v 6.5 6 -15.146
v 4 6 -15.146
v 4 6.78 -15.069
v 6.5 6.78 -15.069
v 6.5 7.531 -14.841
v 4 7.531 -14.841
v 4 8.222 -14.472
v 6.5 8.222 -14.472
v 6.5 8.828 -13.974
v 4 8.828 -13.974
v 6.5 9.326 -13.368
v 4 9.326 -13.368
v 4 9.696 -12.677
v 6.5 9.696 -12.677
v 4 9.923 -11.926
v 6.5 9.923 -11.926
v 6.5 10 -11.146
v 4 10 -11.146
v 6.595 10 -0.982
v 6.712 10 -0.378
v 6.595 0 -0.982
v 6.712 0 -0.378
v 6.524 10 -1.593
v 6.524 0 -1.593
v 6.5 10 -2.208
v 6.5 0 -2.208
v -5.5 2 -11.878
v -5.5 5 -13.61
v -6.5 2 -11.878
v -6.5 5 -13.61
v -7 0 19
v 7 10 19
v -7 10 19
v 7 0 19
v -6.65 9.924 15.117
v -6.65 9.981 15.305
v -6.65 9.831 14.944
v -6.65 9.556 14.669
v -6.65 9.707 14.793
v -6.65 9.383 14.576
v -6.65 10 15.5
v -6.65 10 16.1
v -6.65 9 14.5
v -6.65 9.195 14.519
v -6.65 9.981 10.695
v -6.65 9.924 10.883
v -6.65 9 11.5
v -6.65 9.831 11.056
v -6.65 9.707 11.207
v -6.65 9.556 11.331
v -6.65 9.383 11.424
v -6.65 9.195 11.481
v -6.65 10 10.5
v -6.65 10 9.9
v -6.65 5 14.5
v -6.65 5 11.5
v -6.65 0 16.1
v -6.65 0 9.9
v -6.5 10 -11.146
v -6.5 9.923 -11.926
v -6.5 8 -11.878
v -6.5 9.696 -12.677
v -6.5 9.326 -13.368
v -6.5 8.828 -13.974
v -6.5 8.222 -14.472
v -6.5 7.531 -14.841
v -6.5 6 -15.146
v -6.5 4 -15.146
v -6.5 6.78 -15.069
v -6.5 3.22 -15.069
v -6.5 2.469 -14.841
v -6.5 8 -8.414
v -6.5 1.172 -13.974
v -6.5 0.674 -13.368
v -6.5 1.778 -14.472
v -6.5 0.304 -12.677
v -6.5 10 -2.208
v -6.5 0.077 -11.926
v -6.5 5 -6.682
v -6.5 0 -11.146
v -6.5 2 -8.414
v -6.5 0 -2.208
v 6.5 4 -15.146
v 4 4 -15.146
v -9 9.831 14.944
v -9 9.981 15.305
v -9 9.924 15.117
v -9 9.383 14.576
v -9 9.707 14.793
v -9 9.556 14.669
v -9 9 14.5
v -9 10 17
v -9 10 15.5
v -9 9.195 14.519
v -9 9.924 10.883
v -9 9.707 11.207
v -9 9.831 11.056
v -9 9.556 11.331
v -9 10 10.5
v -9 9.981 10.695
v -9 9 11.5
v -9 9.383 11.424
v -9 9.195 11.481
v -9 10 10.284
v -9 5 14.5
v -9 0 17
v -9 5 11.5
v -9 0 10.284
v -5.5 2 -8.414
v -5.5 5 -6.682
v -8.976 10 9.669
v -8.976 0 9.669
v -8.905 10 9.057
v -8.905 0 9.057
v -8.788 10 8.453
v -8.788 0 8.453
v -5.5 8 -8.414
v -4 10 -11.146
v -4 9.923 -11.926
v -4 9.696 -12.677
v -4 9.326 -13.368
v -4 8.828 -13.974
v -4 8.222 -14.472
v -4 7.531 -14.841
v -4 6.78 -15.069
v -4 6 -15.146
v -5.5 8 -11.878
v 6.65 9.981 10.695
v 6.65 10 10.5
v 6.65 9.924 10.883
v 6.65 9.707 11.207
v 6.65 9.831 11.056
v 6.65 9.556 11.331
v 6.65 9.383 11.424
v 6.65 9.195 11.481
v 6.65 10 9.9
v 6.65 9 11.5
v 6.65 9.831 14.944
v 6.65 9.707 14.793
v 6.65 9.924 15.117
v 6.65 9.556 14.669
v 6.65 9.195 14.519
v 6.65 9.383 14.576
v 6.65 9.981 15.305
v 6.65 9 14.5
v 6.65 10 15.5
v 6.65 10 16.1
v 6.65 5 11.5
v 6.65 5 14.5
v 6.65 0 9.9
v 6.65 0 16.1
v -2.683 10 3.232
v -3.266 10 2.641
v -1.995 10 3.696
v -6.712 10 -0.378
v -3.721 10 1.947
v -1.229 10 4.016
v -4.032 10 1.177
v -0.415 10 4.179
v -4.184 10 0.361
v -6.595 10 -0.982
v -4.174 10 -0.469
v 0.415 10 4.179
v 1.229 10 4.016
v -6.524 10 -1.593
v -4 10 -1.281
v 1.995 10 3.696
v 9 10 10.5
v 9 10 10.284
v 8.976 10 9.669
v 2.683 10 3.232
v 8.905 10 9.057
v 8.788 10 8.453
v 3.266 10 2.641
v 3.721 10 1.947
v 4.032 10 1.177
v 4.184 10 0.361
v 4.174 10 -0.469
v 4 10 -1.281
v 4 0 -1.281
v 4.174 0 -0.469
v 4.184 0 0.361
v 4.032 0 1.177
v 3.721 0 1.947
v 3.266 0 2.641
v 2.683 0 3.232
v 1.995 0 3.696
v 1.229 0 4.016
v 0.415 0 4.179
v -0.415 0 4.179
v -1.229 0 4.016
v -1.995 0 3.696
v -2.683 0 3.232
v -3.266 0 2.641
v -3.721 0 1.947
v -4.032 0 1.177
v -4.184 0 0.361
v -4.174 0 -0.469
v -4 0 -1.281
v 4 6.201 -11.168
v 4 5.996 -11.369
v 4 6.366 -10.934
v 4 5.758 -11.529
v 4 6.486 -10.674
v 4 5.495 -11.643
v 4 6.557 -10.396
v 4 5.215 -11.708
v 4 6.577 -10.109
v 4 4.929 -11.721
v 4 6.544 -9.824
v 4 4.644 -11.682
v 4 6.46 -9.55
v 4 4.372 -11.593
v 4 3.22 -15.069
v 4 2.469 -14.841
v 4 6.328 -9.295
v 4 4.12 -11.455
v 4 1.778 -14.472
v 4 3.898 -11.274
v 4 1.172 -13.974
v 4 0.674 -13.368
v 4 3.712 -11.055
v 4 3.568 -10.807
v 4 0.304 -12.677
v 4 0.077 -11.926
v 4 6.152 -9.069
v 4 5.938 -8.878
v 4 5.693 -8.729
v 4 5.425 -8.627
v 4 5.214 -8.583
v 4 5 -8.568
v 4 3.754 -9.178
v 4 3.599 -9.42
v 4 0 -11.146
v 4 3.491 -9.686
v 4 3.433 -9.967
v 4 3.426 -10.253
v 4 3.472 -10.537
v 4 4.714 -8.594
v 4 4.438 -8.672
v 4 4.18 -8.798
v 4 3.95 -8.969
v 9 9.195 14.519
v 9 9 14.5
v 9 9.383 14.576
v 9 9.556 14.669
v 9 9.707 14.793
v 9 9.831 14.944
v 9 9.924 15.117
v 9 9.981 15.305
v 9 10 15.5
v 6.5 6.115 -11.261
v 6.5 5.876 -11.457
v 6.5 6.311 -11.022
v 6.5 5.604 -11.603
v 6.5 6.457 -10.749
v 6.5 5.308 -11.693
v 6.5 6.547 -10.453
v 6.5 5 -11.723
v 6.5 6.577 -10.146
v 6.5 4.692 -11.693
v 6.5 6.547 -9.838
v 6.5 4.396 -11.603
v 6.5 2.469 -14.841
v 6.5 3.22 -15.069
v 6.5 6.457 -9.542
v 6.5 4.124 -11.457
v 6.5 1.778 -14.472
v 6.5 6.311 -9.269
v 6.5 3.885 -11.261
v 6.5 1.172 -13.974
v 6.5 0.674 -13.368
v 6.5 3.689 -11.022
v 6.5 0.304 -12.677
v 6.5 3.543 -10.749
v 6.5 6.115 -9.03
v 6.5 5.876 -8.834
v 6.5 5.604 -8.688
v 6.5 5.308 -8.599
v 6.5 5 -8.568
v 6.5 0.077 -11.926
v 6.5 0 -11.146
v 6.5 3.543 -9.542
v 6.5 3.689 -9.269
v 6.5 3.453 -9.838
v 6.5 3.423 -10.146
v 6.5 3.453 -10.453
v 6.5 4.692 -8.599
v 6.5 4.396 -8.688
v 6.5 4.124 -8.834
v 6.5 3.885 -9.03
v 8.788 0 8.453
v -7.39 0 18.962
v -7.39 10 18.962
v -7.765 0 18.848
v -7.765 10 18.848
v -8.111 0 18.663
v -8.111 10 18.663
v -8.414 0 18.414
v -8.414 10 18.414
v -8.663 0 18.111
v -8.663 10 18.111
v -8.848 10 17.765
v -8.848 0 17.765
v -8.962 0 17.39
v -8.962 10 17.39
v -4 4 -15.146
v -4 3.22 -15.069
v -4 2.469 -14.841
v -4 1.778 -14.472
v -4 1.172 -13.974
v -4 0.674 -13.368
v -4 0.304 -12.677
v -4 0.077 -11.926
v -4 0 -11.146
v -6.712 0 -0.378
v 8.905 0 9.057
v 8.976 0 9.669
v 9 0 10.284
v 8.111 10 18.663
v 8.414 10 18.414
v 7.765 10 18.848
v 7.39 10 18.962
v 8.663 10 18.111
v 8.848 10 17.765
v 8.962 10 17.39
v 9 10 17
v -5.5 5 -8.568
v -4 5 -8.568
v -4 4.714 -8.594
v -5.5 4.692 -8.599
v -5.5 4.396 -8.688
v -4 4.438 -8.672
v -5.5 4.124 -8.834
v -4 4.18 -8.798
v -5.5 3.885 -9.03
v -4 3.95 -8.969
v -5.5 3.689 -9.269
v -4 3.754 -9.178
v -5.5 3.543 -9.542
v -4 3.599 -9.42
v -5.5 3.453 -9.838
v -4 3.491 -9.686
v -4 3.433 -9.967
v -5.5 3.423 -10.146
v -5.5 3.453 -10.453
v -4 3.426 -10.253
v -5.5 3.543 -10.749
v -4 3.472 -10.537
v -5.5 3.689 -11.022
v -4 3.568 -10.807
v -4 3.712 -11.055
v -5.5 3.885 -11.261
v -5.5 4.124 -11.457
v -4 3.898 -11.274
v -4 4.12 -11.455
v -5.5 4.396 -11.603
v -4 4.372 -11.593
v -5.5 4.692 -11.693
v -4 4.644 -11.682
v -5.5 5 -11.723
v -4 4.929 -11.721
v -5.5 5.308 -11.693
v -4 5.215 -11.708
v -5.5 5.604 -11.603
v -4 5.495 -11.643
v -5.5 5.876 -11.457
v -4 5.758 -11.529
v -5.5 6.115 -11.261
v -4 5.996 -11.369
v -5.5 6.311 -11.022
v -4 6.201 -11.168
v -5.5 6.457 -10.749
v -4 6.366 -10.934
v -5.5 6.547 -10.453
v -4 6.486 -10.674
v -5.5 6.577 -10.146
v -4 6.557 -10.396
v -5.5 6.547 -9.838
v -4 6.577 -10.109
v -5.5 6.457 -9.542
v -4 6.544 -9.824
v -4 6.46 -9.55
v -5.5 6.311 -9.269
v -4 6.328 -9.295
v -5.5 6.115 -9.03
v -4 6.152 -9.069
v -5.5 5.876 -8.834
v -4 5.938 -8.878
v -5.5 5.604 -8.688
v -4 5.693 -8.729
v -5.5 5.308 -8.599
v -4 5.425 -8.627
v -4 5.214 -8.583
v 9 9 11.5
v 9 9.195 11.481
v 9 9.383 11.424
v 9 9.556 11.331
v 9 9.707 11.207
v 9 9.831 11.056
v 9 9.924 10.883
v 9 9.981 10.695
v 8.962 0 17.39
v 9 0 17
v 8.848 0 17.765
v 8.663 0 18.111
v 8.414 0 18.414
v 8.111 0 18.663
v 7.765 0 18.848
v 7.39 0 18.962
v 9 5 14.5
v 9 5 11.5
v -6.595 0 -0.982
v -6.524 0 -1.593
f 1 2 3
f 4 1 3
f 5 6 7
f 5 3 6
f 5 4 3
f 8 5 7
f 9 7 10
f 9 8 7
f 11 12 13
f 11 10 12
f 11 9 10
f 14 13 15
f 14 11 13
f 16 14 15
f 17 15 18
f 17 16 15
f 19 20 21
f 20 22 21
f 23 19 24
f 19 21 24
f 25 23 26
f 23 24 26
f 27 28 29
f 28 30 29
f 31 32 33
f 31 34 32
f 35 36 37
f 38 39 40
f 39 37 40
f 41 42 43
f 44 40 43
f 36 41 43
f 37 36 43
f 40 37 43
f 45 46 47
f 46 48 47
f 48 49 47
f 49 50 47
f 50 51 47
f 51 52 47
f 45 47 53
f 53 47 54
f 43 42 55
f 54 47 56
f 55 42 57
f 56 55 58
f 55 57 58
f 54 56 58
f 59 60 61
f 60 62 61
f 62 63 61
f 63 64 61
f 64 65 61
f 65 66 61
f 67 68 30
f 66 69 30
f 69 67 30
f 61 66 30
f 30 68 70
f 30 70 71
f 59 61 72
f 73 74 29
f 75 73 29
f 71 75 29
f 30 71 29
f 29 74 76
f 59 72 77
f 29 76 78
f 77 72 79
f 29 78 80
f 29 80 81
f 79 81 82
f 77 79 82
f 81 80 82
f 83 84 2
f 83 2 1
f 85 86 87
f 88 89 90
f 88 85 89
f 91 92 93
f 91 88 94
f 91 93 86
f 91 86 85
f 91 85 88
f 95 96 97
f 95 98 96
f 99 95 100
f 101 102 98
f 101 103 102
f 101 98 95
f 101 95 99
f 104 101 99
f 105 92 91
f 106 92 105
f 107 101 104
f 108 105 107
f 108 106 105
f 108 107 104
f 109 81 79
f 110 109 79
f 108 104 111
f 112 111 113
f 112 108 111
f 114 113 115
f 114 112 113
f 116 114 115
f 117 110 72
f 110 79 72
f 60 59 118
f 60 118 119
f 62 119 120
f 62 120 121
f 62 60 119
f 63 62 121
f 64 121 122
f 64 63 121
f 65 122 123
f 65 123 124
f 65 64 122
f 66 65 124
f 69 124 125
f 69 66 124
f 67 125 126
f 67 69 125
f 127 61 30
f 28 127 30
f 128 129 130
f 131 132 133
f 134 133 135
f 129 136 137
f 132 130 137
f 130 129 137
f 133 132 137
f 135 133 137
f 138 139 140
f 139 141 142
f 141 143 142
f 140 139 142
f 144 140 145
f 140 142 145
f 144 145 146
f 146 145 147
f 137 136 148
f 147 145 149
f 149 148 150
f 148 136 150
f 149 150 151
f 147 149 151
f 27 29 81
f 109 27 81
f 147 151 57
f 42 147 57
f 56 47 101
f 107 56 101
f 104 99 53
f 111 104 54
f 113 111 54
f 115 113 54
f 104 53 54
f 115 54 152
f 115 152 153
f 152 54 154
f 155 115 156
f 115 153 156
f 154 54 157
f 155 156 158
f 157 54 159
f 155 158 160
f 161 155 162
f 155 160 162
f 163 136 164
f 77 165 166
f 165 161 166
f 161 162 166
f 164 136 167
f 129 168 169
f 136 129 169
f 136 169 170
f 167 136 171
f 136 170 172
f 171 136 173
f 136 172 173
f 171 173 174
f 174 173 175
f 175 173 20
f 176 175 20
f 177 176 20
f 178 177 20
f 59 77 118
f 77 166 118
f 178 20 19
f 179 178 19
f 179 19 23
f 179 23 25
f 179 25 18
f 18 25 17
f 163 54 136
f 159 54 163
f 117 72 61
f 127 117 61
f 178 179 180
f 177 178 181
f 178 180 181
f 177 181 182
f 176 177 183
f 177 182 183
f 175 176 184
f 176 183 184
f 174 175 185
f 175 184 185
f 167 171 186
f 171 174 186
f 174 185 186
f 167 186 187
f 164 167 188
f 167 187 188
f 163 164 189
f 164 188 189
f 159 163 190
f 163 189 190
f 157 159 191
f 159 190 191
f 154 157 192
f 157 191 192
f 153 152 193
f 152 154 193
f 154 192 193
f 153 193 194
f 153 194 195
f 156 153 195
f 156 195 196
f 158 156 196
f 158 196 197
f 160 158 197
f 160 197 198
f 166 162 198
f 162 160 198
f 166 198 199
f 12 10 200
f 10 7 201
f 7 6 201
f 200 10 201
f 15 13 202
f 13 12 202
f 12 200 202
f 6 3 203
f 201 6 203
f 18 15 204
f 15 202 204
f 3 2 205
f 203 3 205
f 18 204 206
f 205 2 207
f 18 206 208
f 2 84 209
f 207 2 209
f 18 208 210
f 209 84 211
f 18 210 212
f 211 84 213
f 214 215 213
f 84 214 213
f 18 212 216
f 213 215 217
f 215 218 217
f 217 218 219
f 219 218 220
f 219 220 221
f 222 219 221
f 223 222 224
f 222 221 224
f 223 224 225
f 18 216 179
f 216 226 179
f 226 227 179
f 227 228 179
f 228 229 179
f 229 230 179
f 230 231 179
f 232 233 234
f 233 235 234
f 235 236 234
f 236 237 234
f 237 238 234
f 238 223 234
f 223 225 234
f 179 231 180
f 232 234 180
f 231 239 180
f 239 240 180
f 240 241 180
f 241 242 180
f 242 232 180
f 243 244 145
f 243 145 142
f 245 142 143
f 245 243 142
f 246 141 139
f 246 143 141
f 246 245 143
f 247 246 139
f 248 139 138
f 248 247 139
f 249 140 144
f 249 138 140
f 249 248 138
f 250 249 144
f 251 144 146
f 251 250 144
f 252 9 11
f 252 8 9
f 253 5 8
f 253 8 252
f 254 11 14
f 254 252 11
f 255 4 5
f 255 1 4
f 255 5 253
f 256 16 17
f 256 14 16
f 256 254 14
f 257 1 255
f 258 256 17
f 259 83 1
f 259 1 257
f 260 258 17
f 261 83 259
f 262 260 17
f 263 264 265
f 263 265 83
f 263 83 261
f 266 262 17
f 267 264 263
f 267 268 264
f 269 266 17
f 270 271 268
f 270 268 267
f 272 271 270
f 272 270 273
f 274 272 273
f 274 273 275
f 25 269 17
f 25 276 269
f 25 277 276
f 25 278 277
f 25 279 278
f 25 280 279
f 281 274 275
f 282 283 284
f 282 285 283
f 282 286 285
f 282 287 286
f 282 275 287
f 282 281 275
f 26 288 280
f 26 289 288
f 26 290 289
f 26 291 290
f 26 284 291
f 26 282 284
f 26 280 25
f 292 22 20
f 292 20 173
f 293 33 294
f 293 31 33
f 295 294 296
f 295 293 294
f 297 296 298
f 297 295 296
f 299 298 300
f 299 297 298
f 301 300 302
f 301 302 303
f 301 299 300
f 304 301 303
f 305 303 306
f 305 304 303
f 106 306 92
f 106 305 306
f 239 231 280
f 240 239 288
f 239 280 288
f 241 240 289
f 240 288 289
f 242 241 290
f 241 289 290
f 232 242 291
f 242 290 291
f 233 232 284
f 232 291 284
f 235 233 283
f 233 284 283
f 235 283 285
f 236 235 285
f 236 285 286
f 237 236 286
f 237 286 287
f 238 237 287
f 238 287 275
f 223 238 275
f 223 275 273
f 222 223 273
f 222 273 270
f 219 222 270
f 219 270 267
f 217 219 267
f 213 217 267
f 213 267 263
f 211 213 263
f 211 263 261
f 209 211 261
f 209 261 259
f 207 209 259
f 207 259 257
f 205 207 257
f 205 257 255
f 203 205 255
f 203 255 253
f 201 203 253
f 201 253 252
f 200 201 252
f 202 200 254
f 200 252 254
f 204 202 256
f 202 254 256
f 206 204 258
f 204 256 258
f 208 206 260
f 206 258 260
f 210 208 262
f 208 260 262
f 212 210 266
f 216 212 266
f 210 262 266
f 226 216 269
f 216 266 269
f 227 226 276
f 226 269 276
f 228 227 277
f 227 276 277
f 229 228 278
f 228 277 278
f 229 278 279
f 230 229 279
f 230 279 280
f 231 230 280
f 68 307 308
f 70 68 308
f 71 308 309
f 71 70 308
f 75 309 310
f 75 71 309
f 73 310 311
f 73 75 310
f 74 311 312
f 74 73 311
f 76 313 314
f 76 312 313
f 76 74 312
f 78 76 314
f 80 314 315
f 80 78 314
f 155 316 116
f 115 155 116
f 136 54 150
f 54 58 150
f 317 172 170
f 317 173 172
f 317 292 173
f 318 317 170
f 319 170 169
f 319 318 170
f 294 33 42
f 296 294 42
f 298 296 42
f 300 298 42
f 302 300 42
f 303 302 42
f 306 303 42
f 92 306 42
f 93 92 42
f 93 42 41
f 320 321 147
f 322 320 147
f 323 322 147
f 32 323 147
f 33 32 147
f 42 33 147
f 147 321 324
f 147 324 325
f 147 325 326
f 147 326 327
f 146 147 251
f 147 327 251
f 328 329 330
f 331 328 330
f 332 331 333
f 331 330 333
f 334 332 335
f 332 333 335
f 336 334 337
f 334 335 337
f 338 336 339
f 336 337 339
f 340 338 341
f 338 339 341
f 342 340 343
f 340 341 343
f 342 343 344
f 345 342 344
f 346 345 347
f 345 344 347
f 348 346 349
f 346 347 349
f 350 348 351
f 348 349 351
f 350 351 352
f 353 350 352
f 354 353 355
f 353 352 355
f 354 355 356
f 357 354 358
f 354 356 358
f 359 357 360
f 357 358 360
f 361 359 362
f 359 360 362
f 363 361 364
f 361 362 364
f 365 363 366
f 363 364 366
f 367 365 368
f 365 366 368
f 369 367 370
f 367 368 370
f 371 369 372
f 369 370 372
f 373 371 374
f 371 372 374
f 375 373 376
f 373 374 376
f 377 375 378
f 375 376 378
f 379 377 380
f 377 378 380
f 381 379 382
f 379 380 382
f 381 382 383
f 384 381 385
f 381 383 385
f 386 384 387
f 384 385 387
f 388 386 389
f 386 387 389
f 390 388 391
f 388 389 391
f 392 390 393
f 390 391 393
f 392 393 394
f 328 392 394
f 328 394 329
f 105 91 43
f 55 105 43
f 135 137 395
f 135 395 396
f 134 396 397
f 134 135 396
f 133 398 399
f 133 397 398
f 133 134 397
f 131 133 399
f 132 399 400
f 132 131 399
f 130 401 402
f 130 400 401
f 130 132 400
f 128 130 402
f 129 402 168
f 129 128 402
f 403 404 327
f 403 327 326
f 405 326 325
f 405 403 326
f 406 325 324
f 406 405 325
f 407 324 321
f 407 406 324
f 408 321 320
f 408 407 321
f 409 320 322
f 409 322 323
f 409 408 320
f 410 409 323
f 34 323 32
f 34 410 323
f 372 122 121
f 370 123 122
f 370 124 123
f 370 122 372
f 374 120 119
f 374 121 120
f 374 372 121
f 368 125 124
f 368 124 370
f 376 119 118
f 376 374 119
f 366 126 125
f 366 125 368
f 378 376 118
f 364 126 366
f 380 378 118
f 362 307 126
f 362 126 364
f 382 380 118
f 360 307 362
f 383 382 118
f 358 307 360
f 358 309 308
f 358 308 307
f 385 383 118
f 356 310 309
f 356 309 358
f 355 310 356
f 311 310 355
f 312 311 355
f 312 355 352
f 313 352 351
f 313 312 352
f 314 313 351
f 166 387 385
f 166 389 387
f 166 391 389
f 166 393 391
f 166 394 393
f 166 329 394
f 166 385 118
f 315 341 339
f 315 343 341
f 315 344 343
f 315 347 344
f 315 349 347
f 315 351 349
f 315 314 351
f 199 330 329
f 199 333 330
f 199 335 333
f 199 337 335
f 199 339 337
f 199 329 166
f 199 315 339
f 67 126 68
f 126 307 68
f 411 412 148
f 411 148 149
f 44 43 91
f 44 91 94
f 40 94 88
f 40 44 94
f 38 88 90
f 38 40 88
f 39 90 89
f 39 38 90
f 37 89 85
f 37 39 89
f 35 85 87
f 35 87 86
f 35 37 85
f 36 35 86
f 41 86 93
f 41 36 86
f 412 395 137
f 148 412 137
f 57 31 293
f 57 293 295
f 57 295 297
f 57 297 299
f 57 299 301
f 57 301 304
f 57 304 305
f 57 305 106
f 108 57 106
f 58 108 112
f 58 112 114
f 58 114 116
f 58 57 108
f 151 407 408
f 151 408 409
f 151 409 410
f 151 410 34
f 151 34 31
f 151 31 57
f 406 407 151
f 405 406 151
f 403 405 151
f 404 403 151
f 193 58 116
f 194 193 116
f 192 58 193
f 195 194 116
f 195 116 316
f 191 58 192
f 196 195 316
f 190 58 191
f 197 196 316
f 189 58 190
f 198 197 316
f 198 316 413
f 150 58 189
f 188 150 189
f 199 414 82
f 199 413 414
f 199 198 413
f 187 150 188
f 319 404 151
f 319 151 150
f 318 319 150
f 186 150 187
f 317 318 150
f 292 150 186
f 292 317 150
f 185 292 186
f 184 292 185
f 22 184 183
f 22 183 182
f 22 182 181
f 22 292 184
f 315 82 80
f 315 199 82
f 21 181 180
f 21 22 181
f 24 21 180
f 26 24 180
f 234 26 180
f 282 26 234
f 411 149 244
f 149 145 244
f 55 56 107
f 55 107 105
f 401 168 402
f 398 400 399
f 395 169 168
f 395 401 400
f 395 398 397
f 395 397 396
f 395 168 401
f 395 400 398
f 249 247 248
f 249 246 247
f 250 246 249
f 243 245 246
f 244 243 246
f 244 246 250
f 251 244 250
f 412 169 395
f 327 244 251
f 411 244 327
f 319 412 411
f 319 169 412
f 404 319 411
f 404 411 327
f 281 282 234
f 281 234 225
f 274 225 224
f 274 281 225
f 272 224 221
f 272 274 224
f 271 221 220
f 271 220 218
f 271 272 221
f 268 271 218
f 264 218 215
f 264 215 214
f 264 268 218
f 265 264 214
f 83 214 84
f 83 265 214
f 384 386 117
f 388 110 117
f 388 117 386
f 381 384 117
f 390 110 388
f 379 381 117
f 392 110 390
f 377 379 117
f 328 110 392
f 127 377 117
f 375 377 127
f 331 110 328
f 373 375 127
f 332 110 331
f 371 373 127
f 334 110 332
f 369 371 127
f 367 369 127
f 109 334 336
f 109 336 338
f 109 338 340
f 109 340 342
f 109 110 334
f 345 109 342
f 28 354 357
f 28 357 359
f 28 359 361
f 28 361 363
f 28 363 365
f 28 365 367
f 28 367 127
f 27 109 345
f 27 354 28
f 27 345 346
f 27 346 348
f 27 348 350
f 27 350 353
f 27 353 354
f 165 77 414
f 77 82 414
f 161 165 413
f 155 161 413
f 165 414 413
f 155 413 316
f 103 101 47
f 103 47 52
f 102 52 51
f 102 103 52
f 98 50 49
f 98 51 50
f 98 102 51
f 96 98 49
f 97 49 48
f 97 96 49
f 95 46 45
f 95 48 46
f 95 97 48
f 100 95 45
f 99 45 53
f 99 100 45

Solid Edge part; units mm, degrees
sketch "Sketch1" plane through (0, 0, 0) normal (0, -1, 0) x (1, 0, 0)
  line L0 (-6.65, 9.9) -> (6.65, 9.9)
  line L1 (6.65, 9.9) -> (6.65, 16.1)
  line L2 (6.65, 16.1) -> (-6.65, 16.1)
  line L3 (-6.65, 16.1) -> (-6.65, 9.9)
  line L4 (9, 10.2836) -> (9, 17)
  arc A0 (9, 17) -> (7, 19) centre (7, 17) ccw
  line L5 (7, 19) -> (-7, 19)
  arc A1 (-7, 19) -> (-9, 17) centre (-7, 17) ccw
  line L6 (-9, 17) -> (-9, 10.2836)
  arc A2 (-9, 10.2836) -> (-8.7878, 8.4533) centre (-1, 10.2836) ccw
  line L7 (-6.7122, -0.3777) -> (-8.7878, 8.4533)
  arc A3 (-6.5, -2.2081) -> (-6.7122, -0.3777) centre (-14.5, -2.2081) ccw
  line L8 (-6.5, -15.1458) -> (-6.5, -2.2081)
  line L9 (-4, -15.1458) -> (-6.5, -15.1458)
  line L10 (-4, -15.1458) -> (-4, -1.2806)
  line L11 (4, -15.1458) -> (4, -1.2806)
  line L12 (4, -15.1458) -> (6.5, -15.1458)
  line L13 (6.5, -15.1458) -> (6.5, -2.2081)
  arc A4 (6.5, -2.2081) -> (6.7122, -0.3777) centre (14.5, -2.2081) cw
  line L14 (6.7122, -0.3777) -> (8.7878, 8.4533)
  arc A5 (9, 10.2836) -> (8.7878, 8.4533) centre (1, 10.2836) cw
  arc A6 (-4, -1.2806) -> (4, -1.2806) centre (0, 0) cw
  dimension "D1" = 13.3
  dimension "D2" = 6.2
extrude "Protrusion1" add sketch "Sketch1" against normal blind 10
sketch "Sketch2" plane through (6.5, 6, -9.599) normal (1, 0, 0) x (0, 0, 1)
  circle A0 centre (-0.5467, 1) radius 1.5773
  dimension "D1" = 5
  dimension "D2" = 5
extrude "Cutout1" cut sketch "Sketch2" against normal up to vertex (13 mm away)
sketch "Sketch3" plane through (-6.5, 6, -9.599) normal (-1, 0, 0) x (0, 0, -1)
  line L0 (-1.1853, 4) -> (-2.9174, 1)
  line L1 (-2.9174, 1) -> (-1.1853, -2)
  line L2 (-1.1853, -2) -> (2.2788, -2)
  line L3 (2.2788, -2) -> (4.0108, 1)
  line L4 (4.0108, 1) -> (2.2788, 4)
  line L5 (2.2788, 4) -> (-1.1853, 4)
extrude "ExtrudedCutout_2" cut sketch "Sketch3" against normal blind 1
fillet "Round_1" radius 4 4 edges at (-5.25, 0, -15.1458) (-5.25, 10, -15.1458) (5.25, 10, -15.1458) (5.25, 0, -15.1458)
sketch "Sketch4" plane through (0, 10, 4.4271) normal (0, 1, 0) x (-1, 0, 0)
  line L0 (-10, 7.0729) -> (10, 7.0729)
  line L1 (10, 7.0729) -> (10, 10.0729)
  line L2 (10, 10.0729) -> (-10, 10.0729)
  line L3 (-10, 10.0729) -> (-10, 7.0729)
extrude "ExtrudedCutout_3" cut sketch "Sketch4" against normal blind 5
fillet "Round_5" radius 1 4 edges at (7.825, 10, 11.5) (7.825, 10, 14.5) (-7.825, 10, 11.5) (-7.825, 10, 14.5)
